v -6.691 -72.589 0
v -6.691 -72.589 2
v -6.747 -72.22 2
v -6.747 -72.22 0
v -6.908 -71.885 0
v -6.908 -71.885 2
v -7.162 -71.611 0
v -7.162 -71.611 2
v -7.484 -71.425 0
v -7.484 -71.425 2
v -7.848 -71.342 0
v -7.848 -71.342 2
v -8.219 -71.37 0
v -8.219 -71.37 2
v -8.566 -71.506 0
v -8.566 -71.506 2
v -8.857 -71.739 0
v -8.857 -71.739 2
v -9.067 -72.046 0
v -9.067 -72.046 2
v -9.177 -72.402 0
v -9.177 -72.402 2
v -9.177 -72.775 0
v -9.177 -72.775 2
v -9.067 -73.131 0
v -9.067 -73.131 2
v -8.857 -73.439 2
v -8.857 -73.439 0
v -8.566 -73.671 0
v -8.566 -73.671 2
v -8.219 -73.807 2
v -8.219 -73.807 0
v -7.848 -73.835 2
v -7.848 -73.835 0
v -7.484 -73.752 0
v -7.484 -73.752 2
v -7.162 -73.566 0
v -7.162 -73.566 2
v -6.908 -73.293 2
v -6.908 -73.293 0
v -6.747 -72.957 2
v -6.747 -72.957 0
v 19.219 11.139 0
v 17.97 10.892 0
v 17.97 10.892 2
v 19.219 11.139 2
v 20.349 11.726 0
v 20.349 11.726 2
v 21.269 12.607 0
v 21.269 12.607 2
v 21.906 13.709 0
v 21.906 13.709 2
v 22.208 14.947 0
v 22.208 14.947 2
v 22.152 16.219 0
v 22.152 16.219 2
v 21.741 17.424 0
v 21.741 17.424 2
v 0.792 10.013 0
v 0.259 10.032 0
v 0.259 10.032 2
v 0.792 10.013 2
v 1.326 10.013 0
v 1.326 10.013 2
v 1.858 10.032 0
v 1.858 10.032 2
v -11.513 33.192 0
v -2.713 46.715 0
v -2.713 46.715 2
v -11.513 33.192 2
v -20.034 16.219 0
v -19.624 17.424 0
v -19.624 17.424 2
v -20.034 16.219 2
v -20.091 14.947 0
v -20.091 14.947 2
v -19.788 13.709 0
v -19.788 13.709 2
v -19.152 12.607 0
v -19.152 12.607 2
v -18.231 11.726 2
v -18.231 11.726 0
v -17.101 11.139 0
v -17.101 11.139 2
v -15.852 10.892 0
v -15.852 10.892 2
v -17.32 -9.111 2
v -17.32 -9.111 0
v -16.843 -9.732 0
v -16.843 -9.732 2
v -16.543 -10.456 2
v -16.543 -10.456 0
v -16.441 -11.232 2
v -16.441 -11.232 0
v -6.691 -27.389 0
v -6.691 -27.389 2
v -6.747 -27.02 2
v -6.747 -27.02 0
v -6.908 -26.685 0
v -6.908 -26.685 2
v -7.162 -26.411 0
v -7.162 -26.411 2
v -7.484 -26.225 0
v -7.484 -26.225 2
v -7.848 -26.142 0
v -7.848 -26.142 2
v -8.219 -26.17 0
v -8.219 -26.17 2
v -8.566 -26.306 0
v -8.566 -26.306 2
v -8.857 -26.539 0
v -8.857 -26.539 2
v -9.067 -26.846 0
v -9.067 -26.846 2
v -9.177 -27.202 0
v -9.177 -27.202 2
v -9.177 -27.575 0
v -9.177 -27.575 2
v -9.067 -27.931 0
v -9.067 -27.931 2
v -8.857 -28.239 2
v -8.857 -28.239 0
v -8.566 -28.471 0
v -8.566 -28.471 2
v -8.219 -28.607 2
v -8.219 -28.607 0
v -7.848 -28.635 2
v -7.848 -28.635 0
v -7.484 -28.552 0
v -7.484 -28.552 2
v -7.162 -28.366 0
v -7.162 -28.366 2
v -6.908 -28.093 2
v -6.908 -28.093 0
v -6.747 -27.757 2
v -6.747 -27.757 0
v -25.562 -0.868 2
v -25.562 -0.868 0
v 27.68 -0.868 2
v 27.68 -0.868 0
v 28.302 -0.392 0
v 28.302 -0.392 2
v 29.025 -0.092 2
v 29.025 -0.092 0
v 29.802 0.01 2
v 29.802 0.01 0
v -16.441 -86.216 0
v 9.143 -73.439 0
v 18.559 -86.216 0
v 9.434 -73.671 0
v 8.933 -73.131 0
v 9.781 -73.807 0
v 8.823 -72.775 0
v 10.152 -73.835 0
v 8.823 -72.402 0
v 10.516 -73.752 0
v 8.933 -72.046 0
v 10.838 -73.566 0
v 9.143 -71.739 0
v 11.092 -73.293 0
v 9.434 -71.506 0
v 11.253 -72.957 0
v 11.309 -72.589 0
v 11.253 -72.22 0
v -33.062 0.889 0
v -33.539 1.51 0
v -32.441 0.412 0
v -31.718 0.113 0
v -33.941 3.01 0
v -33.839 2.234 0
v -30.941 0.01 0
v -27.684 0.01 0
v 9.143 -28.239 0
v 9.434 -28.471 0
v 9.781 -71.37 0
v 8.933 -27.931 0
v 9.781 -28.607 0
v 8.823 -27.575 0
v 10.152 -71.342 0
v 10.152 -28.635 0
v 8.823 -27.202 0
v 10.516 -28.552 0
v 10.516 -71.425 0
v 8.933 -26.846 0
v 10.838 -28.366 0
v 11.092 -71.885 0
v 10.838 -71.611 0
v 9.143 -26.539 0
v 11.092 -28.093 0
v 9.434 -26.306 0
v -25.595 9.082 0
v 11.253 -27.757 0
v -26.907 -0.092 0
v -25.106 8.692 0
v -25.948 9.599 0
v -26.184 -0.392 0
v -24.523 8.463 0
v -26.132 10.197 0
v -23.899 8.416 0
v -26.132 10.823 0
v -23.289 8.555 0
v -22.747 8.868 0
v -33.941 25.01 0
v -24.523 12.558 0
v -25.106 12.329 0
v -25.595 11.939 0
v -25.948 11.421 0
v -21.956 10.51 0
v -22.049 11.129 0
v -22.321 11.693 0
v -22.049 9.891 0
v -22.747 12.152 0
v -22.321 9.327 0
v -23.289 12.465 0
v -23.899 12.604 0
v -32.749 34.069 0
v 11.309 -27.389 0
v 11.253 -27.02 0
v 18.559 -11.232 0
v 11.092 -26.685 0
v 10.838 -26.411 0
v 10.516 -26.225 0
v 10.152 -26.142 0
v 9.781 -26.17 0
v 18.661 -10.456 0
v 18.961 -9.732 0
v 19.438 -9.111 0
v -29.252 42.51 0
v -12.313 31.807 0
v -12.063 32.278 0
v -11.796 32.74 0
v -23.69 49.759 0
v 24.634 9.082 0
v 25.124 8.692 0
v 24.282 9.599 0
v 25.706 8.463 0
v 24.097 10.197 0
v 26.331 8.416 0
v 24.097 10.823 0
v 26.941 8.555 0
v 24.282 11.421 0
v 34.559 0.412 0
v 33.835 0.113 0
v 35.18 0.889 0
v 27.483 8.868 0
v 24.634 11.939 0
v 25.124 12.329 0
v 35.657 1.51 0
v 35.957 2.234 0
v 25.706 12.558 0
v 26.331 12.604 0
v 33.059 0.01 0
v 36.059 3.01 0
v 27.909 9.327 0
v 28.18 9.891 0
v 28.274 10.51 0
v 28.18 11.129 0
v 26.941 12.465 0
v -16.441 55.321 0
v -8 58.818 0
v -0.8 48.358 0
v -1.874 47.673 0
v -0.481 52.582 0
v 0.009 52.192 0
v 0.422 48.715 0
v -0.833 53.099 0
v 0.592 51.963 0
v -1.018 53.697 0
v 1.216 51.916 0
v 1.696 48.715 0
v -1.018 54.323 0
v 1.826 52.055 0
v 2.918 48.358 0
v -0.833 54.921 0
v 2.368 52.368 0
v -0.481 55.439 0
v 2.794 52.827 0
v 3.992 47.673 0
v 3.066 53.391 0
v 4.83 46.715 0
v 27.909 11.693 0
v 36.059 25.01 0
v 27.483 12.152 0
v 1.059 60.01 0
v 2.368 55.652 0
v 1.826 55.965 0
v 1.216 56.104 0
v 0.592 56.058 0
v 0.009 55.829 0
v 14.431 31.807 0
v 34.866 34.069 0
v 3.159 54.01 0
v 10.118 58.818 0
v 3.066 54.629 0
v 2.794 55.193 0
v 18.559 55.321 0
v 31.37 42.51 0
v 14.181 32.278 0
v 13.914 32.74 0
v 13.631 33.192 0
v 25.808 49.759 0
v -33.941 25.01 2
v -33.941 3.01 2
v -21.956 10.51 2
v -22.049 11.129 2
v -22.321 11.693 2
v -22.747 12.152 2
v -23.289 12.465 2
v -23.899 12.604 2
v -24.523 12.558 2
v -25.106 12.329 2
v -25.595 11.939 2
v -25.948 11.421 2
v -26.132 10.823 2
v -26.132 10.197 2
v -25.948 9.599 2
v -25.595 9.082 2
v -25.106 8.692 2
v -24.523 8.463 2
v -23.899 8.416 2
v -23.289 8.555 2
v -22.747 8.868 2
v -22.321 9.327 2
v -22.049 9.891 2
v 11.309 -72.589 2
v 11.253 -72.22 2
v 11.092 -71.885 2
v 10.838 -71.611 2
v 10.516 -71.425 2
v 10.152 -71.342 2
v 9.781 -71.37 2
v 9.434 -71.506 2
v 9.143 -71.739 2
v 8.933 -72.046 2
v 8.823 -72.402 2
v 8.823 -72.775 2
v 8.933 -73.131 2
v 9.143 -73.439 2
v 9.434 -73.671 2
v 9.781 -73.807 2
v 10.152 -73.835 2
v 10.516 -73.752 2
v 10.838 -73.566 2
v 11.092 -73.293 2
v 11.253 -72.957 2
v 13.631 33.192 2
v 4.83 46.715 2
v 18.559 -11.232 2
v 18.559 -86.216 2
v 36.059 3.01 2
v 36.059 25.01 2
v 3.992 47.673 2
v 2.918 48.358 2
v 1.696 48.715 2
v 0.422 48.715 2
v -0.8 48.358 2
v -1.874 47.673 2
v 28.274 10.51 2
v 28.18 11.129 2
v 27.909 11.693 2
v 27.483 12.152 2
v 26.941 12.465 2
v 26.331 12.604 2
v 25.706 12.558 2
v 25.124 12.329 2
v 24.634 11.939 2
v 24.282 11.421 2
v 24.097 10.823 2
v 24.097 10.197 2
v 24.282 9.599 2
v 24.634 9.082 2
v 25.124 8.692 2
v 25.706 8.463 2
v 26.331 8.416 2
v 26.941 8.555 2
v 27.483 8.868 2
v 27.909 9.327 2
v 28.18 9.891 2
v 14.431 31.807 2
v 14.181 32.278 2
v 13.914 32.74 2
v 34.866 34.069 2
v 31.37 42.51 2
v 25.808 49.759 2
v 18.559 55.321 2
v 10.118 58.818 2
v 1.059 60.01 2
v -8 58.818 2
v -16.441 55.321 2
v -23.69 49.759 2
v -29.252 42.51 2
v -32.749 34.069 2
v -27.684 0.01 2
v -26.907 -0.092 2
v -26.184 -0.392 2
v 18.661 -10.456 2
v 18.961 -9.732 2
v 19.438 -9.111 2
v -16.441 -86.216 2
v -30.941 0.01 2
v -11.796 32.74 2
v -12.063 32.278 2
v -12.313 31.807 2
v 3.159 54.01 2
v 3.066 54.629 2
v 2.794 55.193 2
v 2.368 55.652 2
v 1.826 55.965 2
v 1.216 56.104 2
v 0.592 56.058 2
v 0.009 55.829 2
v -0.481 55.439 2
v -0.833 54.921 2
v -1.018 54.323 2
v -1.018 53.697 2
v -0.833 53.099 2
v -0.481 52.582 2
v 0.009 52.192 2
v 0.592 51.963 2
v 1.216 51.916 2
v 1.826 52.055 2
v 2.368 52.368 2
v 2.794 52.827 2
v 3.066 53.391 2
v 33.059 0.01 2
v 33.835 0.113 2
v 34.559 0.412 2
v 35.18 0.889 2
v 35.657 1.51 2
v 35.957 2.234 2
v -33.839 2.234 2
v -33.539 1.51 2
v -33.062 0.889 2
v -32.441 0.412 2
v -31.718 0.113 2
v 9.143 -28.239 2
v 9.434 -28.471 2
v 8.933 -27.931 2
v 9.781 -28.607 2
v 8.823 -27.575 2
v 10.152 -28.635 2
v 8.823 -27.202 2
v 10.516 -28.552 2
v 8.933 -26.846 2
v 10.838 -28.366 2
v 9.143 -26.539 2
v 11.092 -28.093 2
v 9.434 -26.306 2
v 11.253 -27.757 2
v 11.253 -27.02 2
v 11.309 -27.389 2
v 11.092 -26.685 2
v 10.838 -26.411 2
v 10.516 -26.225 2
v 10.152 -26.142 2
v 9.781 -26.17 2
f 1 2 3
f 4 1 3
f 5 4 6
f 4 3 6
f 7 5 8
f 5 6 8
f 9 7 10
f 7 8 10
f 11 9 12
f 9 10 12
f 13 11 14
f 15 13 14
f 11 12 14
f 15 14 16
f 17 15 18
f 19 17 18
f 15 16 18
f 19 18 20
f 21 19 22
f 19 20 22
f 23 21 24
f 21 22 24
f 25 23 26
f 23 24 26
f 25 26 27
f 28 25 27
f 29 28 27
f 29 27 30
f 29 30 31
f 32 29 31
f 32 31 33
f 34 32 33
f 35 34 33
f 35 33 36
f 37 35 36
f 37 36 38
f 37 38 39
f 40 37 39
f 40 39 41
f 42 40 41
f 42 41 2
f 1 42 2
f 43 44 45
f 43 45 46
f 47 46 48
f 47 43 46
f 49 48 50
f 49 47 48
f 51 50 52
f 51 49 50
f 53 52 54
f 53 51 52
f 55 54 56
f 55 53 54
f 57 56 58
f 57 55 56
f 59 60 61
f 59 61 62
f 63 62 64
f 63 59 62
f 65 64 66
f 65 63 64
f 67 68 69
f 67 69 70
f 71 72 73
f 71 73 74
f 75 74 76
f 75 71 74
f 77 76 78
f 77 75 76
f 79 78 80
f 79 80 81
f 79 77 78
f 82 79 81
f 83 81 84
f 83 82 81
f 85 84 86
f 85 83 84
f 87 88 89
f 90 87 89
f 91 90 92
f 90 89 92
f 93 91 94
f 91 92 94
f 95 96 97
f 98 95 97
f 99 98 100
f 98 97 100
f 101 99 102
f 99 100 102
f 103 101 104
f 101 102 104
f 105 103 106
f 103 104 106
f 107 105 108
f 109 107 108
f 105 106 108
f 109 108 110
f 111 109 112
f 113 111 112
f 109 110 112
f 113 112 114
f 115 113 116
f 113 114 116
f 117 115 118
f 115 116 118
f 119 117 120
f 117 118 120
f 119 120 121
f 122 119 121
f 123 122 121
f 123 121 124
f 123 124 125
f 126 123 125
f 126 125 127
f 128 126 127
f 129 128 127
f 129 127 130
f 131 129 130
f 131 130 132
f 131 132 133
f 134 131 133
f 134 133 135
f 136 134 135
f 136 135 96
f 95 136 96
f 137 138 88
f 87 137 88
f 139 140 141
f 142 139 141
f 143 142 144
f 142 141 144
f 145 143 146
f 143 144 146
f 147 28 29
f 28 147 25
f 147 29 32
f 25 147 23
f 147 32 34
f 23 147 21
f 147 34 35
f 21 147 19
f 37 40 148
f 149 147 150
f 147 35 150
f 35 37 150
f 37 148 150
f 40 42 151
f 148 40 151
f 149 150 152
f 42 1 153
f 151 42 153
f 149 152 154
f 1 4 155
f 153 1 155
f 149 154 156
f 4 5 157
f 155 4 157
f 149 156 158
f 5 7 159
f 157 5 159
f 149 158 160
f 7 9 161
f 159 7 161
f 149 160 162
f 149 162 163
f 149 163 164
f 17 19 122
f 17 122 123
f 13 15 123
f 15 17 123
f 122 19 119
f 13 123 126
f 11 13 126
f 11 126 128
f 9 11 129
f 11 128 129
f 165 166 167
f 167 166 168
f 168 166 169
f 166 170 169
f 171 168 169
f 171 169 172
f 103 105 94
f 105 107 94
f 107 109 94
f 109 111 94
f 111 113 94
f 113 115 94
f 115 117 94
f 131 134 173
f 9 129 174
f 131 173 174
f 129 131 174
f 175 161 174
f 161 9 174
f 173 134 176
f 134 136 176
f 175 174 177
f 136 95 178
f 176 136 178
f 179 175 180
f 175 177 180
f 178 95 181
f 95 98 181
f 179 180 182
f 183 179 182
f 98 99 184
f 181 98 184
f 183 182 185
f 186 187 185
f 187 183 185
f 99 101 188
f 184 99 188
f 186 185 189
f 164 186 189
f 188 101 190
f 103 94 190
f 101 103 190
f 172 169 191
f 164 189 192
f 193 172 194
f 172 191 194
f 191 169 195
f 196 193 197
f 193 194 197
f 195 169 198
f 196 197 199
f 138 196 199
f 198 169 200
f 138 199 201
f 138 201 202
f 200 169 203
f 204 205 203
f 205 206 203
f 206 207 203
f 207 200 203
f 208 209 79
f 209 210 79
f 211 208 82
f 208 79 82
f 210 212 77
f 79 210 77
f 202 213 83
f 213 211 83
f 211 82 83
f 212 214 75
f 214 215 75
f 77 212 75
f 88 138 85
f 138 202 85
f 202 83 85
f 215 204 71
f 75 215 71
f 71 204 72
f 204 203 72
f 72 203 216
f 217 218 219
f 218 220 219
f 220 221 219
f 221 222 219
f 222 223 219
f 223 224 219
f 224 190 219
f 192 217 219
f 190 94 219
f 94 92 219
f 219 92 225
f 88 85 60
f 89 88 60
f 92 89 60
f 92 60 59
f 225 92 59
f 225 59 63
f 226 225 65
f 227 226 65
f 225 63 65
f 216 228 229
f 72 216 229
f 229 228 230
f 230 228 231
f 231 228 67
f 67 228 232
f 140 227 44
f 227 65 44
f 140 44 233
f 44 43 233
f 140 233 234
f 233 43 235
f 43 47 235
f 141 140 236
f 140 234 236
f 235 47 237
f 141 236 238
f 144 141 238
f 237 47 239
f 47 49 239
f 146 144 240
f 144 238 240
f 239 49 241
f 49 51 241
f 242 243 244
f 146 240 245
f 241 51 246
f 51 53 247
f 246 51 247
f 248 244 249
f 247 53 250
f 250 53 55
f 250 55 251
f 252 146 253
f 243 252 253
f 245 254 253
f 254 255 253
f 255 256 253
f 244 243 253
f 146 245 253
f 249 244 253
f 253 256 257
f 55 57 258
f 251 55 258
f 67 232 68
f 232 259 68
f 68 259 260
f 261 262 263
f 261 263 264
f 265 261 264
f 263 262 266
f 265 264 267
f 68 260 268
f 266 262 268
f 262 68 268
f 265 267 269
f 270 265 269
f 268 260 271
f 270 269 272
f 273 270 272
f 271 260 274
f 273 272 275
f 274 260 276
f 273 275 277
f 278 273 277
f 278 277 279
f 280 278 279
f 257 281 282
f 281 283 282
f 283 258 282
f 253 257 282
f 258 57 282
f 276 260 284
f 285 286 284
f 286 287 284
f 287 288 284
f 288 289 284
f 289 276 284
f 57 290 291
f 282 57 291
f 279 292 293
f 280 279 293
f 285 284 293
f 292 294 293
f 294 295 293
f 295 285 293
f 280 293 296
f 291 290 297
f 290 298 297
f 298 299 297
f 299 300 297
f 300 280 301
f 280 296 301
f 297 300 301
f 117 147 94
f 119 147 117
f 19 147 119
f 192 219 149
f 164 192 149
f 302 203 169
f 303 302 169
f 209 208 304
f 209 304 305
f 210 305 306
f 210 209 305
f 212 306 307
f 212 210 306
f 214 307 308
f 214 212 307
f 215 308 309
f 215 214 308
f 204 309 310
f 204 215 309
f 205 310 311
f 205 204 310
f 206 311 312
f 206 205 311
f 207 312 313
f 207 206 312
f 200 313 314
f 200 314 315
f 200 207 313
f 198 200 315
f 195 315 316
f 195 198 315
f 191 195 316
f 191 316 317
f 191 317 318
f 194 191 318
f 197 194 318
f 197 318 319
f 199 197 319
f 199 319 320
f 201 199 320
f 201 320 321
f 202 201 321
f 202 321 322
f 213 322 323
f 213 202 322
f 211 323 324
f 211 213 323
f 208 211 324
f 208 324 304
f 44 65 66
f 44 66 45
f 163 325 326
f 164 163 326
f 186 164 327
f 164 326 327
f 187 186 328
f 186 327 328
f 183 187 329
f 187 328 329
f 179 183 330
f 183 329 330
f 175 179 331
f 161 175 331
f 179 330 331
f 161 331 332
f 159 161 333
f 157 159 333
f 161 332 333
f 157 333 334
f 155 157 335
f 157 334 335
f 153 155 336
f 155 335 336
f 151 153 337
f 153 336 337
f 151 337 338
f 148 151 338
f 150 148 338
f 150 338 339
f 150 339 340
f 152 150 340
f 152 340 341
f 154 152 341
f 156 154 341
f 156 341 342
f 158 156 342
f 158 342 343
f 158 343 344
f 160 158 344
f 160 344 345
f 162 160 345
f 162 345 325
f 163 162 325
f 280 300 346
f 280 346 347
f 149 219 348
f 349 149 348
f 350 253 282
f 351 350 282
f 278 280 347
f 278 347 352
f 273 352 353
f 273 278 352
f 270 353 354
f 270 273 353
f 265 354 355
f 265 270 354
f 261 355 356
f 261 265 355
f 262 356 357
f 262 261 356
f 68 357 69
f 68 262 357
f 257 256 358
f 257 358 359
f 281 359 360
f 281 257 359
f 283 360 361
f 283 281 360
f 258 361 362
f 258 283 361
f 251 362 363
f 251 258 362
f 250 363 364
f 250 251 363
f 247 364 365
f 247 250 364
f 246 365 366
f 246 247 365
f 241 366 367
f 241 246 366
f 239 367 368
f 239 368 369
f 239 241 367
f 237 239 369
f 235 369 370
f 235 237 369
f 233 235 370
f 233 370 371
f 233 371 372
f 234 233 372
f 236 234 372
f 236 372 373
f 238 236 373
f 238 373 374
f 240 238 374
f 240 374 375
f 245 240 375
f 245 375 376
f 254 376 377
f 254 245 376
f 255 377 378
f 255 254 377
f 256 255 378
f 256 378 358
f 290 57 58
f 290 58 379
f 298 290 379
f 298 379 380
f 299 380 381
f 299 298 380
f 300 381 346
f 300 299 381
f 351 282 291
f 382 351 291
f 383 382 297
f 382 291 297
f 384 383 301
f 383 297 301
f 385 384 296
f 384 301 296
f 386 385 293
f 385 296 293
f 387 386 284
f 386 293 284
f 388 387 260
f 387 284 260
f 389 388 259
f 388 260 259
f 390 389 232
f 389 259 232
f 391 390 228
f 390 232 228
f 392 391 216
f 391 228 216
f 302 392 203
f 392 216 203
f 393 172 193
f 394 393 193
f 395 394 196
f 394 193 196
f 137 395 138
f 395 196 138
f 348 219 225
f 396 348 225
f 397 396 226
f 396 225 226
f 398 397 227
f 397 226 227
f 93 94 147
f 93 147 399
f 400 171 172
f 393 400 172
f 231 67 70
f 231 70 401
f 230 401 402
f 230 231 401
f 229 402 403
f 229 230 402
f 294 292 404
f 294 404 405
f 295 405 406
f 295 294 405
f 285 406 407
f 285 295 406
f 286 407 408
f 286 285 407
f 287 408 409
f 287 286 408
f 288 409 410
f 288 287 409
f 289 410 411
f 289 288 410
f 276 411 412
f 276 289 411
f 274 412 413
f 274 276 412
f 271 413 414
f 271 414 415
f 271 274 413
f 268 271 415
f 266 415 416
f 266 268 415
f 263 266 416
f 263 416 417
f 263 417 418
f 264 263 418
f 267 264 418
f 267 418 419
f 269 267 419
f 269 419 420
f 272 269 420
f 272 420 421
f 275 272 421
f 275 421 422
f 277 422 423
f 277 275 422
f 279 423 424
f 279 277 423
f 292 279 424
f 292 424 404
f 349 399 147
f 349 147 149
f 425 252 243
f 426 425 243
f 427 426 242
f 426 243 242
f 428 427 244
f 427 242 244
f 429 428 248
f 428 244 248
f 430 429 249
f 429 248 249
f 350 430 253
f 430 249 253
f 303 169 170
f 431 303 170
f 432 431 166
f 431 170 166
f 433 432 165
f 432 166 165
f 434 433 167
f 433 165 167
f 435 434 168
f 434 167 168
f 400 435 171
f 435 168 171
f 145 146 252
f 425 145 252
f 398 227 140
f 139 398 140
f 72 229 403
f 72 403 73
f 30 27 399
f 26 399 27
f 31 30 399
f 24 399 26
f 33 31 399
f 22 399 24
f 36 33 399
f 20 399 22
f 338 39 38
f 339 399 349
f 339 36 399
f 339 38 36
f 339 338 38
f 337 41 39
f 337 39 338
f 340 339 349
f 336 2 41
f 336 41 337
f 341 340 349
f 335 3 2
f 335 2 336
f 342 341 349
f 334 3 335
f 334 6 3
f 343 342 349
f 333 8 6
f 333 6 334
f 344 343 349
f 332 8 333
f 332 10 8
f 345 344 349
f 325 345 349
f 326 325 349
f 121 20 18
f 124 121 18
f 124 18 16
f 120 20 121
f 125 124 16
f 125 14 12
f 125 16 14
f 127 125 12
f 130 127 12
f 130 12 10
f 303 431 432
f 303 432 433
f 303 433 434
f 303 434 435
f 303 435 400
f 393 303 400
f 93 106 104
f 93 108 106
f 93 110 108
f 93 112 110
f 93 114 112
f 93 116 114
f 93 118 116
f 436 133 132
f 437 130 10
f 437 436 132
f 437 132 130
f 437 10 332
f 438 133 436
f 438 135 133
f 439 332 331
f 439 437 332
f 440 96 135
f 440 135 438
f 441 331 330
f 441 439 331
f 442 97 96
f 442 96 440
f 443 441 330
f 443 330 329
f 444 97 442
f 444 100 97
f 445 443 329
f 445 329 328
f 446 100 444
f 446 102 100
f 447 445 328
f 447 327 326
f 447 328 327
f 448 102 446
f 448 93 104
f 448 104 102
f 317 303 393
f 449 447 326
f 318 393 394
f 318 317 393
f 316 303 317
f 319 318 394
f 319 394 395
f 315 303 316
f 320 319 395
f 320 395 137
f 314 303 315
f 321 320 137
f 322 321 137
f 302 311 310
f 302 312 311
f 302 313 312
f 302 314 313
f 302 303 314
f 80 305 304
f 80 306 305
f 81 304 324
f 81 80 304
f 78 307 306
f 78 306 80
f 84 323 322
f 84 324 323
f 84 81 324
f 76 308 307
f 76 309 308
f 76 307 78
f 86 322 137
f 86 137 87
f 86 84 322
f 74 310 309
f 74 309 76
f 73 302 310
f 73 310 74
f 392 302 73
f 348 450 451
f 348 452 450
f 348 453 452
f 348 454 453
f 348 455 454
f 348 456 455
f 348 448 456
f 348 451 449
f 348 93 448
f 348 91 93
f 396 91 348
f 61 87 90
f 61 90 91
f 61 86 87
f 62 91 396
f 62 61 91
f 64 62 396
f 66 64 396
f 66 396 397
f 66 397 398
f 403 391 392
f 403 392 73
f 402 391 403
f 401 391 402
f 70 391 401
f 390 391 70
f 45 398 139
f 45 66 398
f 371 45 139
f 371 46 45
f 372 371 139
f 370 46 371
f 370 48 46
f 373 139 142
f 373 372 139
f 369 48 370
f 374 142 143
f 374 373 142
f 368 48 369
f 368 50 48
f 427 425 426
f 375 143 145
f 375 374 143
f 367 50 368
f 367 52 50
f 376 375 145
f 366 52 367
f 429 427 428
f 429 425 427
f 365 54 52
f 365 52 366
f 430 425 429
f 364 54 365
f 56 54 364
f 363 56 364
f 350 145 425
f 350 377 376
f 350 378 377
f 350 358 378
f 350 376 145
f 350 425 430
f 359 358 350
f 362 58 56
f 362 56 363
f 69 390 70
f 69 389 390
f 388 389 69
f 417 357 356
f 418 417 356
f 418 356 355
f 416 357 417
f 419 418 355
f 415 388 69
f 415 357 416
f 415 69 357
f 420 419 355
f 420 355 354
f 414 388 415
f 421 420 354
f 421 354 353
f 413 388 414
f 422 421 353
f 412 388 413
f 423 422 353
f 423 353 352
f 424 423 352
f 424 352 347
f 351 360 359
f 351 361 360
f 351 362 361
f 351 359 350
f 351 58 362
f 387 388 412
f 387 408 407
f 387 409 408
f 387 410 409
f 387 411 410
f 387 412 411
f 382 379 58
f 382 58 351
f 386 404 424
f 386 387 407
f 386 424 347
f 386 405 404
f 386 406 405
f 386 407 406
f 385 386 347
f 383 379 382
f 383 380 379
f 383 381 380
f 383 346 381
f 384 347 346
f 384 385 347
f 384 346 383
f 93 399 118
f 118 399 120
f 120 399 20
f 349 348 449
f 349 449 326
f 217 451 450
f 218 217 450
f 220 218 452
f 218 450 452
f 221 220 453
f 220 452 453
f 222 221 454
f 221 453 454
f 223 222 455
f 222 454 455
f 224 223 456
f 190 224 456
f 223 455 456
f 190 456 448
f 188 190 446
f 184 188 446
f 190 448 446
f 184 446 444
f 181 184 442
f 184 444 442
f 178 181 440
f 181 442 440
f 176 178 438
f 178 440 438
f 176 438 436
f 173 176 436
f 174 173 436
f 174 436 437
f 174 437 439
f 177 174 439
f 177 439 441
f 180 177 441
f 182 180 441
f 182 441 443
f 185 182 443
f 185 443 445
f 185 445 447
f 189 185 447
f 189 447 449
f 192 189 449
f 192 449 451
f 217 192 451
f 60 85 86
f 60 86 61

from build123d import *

# Parameters (mm, degrees)
SKETCH_1_R          = 2.1
EXTRUDE_1_DEPTH     = 2
SKETCH_2_W          = 35
SKETCH_2_H          = 2
EXTRUDE_2_DEPTH     = 30
SKETCH_4_W          = 35
SKETCH_4_H          = 3
CUT_EXTRUDE_2_DEPTH = 10
SKETCH_5_R          = 1.25
CUT_EXTRUDE_3_DEPTH = 10


with BuildPart() as part:
    # 草图1 → 凸台-拉伸1 (new body)
    with BuildSketch(Plane.XY):
        with BuildLine():
            Line((-33.941138155, 25.010321846), (-33.941138155, 3.010321846))
            ThreePointArc((-33.941138155, 3.010321846), (-33.062458498, 0.889001502), (-30.941138155, 0.010321846))
            Line((-30.941138155, 0.010321846), (-27.683778842, 0.010321846))
            ThreePointArc((-27.683778842, 0.010321846), (-26.535728545, -0.218039556), (-25.562458498, -0.86835781))
            Line((-25.562458498, -0.86835781), (-17.319817811, -9.110998498))
            ThreePointArc((-17.319817811, -9.110998498), (-16.669499557, -10.084268544), (-16.441138155, -11.232318841))
            Line((-16.441138155, -11.232318841), (-16.441138155, -59.216175462))
            Line((-16.441138155, -59.216175462), (18.558861845, -59.216175462))
            Line((18.558861845, -59.216175462), (18.558861845, -11.232318841))
            ThreePointArc((18.558861845, -11.232318841), (18.787223248, -10.084268544), (19.437541502, -9.110998498))
            Line((19.437541502, -9.110998498), (27.680182189, -0.86835781))
            ThreePointArc((27.680182189, -0.86835781), (28.653452235, -0.218039556), (29.801502532, 0.010321846))
            Line((29.801502532, 0.010321846), (33.058861845, 0.010321846))
            ThreePointArc((33.058861845, 0.010321846), (35.180182189, 0.889001502), (36.058861845, 3.010321846))
            Line((36.058861845, 3.010321846), (36.058861845, 25.010321846))
            ThreePointArc((36.058861845, 25.010321846), (1.058861845, 60.010321846), (-33.941138155, 25.010321846))
        make_face()
        with Locations((26.173598555, 10.510321846)):
            Circle(SKETCH_1_R, mode=Mode.SUBTRACT)
        with Locations((-24.055874865, 10.510321846)):
            Circle(SKETCH_1_R, mode=Mode.SUBTRACT)
        with Locations((1.058861845, 54.010321846)):
            Circle(SKETCH_1_R, mode=Mode.SUBTRACT)
        with BuildLine():
            Line((13.630967923, 33.192140028), (4.830493669, 46.714867301))
            ThreePointArc((4.830493669, 46.714867301), (1.058861845, 48.760321846), (-2.712769978, 46.714867301))
            Line((-2.712769978, 46.714867301), (-11.513244233, 33.192140028))
            ThreePointArc((-11.513244233, 33.192140028), (-11.931519212, 32.510321846), (-12.312853589, 31.807175998))
            Line((-12.312853589, 31.807175998), (-19.623641808, 17.424378092))
            ThreePointArc((-19.623641808, 17.424378092), (-19.509241495, 13.135321846), (-15.852009984, 10.891720146))
            Line((-15.852009984, 10.891720146), (0.25925249, 10.031649512))
            ThreePointArc((0.25925249, 10.031649512), (1.058861845, 10.010321846), (1.858471201, 10.031649512))
            Line((1.858471201, 10.031649512), (17.969733675, 10.891720146))
            ThreePointArc((17.969733675, 10.891720146), (21.626965185, 13.135321846), (21.741365498, 17.424378092))
            Line((21.741365498, 17.424378092), (14.430577279, 31.807175998))
            ThreePointArc((14.430577279, 31.807175998), (14.049242902, 32.510321846), (13.630967923, 33.192140028))
        make_face(mode=Mode.SUBTRACT)
    extrude(amount=EXTRUDE_1_DEPTH)

    # 草图2 → 凸台-拉伸2 (add)
    with BuildSketch(Plane.XZ.offset(59.216175462)):
        with Locations((1.058861845, 1)):
            Rectangle(SKETCH_2_W, SKETCH_2_H)
    extrude(amount=EXTRUDE_2_DEPTH)

    # 草图4 → 切除-拉伸2 (cut)
    with BuildSketch(Plane.XY.offset(2)):
        with Locations((1.058861845, -87.716175462)):
            Rectangle(SKETCH_4_W, SKETCH_4_H)
    extrude(amount=-CUT_EXTRUDE_2_DEPTH, mode=Mode.SUBTRACT)

    # 草图5 → 切除-拉伸3 (cut)
    with BuildSketch(Plane.XY.offset(2)):
        with Locations((10.058861845, -27.388786859)):
            Circle(SKETCH_5_R)
        with Locations((-7.941138155, -27.388786859)):
            Circle(SKETCH_5_R)
        with Locations((-7.941138155, -72.588786859)):
            Circle(SKETCH_5_R)
        with Locations((10.058861845, -72.588786859)):
            Circle(SKETCH_5_R)
    extrude(amount=-CUT_EXTRUDE_3_DEPTH, mode=Mode.SUBTRACT)


solid = part.part
